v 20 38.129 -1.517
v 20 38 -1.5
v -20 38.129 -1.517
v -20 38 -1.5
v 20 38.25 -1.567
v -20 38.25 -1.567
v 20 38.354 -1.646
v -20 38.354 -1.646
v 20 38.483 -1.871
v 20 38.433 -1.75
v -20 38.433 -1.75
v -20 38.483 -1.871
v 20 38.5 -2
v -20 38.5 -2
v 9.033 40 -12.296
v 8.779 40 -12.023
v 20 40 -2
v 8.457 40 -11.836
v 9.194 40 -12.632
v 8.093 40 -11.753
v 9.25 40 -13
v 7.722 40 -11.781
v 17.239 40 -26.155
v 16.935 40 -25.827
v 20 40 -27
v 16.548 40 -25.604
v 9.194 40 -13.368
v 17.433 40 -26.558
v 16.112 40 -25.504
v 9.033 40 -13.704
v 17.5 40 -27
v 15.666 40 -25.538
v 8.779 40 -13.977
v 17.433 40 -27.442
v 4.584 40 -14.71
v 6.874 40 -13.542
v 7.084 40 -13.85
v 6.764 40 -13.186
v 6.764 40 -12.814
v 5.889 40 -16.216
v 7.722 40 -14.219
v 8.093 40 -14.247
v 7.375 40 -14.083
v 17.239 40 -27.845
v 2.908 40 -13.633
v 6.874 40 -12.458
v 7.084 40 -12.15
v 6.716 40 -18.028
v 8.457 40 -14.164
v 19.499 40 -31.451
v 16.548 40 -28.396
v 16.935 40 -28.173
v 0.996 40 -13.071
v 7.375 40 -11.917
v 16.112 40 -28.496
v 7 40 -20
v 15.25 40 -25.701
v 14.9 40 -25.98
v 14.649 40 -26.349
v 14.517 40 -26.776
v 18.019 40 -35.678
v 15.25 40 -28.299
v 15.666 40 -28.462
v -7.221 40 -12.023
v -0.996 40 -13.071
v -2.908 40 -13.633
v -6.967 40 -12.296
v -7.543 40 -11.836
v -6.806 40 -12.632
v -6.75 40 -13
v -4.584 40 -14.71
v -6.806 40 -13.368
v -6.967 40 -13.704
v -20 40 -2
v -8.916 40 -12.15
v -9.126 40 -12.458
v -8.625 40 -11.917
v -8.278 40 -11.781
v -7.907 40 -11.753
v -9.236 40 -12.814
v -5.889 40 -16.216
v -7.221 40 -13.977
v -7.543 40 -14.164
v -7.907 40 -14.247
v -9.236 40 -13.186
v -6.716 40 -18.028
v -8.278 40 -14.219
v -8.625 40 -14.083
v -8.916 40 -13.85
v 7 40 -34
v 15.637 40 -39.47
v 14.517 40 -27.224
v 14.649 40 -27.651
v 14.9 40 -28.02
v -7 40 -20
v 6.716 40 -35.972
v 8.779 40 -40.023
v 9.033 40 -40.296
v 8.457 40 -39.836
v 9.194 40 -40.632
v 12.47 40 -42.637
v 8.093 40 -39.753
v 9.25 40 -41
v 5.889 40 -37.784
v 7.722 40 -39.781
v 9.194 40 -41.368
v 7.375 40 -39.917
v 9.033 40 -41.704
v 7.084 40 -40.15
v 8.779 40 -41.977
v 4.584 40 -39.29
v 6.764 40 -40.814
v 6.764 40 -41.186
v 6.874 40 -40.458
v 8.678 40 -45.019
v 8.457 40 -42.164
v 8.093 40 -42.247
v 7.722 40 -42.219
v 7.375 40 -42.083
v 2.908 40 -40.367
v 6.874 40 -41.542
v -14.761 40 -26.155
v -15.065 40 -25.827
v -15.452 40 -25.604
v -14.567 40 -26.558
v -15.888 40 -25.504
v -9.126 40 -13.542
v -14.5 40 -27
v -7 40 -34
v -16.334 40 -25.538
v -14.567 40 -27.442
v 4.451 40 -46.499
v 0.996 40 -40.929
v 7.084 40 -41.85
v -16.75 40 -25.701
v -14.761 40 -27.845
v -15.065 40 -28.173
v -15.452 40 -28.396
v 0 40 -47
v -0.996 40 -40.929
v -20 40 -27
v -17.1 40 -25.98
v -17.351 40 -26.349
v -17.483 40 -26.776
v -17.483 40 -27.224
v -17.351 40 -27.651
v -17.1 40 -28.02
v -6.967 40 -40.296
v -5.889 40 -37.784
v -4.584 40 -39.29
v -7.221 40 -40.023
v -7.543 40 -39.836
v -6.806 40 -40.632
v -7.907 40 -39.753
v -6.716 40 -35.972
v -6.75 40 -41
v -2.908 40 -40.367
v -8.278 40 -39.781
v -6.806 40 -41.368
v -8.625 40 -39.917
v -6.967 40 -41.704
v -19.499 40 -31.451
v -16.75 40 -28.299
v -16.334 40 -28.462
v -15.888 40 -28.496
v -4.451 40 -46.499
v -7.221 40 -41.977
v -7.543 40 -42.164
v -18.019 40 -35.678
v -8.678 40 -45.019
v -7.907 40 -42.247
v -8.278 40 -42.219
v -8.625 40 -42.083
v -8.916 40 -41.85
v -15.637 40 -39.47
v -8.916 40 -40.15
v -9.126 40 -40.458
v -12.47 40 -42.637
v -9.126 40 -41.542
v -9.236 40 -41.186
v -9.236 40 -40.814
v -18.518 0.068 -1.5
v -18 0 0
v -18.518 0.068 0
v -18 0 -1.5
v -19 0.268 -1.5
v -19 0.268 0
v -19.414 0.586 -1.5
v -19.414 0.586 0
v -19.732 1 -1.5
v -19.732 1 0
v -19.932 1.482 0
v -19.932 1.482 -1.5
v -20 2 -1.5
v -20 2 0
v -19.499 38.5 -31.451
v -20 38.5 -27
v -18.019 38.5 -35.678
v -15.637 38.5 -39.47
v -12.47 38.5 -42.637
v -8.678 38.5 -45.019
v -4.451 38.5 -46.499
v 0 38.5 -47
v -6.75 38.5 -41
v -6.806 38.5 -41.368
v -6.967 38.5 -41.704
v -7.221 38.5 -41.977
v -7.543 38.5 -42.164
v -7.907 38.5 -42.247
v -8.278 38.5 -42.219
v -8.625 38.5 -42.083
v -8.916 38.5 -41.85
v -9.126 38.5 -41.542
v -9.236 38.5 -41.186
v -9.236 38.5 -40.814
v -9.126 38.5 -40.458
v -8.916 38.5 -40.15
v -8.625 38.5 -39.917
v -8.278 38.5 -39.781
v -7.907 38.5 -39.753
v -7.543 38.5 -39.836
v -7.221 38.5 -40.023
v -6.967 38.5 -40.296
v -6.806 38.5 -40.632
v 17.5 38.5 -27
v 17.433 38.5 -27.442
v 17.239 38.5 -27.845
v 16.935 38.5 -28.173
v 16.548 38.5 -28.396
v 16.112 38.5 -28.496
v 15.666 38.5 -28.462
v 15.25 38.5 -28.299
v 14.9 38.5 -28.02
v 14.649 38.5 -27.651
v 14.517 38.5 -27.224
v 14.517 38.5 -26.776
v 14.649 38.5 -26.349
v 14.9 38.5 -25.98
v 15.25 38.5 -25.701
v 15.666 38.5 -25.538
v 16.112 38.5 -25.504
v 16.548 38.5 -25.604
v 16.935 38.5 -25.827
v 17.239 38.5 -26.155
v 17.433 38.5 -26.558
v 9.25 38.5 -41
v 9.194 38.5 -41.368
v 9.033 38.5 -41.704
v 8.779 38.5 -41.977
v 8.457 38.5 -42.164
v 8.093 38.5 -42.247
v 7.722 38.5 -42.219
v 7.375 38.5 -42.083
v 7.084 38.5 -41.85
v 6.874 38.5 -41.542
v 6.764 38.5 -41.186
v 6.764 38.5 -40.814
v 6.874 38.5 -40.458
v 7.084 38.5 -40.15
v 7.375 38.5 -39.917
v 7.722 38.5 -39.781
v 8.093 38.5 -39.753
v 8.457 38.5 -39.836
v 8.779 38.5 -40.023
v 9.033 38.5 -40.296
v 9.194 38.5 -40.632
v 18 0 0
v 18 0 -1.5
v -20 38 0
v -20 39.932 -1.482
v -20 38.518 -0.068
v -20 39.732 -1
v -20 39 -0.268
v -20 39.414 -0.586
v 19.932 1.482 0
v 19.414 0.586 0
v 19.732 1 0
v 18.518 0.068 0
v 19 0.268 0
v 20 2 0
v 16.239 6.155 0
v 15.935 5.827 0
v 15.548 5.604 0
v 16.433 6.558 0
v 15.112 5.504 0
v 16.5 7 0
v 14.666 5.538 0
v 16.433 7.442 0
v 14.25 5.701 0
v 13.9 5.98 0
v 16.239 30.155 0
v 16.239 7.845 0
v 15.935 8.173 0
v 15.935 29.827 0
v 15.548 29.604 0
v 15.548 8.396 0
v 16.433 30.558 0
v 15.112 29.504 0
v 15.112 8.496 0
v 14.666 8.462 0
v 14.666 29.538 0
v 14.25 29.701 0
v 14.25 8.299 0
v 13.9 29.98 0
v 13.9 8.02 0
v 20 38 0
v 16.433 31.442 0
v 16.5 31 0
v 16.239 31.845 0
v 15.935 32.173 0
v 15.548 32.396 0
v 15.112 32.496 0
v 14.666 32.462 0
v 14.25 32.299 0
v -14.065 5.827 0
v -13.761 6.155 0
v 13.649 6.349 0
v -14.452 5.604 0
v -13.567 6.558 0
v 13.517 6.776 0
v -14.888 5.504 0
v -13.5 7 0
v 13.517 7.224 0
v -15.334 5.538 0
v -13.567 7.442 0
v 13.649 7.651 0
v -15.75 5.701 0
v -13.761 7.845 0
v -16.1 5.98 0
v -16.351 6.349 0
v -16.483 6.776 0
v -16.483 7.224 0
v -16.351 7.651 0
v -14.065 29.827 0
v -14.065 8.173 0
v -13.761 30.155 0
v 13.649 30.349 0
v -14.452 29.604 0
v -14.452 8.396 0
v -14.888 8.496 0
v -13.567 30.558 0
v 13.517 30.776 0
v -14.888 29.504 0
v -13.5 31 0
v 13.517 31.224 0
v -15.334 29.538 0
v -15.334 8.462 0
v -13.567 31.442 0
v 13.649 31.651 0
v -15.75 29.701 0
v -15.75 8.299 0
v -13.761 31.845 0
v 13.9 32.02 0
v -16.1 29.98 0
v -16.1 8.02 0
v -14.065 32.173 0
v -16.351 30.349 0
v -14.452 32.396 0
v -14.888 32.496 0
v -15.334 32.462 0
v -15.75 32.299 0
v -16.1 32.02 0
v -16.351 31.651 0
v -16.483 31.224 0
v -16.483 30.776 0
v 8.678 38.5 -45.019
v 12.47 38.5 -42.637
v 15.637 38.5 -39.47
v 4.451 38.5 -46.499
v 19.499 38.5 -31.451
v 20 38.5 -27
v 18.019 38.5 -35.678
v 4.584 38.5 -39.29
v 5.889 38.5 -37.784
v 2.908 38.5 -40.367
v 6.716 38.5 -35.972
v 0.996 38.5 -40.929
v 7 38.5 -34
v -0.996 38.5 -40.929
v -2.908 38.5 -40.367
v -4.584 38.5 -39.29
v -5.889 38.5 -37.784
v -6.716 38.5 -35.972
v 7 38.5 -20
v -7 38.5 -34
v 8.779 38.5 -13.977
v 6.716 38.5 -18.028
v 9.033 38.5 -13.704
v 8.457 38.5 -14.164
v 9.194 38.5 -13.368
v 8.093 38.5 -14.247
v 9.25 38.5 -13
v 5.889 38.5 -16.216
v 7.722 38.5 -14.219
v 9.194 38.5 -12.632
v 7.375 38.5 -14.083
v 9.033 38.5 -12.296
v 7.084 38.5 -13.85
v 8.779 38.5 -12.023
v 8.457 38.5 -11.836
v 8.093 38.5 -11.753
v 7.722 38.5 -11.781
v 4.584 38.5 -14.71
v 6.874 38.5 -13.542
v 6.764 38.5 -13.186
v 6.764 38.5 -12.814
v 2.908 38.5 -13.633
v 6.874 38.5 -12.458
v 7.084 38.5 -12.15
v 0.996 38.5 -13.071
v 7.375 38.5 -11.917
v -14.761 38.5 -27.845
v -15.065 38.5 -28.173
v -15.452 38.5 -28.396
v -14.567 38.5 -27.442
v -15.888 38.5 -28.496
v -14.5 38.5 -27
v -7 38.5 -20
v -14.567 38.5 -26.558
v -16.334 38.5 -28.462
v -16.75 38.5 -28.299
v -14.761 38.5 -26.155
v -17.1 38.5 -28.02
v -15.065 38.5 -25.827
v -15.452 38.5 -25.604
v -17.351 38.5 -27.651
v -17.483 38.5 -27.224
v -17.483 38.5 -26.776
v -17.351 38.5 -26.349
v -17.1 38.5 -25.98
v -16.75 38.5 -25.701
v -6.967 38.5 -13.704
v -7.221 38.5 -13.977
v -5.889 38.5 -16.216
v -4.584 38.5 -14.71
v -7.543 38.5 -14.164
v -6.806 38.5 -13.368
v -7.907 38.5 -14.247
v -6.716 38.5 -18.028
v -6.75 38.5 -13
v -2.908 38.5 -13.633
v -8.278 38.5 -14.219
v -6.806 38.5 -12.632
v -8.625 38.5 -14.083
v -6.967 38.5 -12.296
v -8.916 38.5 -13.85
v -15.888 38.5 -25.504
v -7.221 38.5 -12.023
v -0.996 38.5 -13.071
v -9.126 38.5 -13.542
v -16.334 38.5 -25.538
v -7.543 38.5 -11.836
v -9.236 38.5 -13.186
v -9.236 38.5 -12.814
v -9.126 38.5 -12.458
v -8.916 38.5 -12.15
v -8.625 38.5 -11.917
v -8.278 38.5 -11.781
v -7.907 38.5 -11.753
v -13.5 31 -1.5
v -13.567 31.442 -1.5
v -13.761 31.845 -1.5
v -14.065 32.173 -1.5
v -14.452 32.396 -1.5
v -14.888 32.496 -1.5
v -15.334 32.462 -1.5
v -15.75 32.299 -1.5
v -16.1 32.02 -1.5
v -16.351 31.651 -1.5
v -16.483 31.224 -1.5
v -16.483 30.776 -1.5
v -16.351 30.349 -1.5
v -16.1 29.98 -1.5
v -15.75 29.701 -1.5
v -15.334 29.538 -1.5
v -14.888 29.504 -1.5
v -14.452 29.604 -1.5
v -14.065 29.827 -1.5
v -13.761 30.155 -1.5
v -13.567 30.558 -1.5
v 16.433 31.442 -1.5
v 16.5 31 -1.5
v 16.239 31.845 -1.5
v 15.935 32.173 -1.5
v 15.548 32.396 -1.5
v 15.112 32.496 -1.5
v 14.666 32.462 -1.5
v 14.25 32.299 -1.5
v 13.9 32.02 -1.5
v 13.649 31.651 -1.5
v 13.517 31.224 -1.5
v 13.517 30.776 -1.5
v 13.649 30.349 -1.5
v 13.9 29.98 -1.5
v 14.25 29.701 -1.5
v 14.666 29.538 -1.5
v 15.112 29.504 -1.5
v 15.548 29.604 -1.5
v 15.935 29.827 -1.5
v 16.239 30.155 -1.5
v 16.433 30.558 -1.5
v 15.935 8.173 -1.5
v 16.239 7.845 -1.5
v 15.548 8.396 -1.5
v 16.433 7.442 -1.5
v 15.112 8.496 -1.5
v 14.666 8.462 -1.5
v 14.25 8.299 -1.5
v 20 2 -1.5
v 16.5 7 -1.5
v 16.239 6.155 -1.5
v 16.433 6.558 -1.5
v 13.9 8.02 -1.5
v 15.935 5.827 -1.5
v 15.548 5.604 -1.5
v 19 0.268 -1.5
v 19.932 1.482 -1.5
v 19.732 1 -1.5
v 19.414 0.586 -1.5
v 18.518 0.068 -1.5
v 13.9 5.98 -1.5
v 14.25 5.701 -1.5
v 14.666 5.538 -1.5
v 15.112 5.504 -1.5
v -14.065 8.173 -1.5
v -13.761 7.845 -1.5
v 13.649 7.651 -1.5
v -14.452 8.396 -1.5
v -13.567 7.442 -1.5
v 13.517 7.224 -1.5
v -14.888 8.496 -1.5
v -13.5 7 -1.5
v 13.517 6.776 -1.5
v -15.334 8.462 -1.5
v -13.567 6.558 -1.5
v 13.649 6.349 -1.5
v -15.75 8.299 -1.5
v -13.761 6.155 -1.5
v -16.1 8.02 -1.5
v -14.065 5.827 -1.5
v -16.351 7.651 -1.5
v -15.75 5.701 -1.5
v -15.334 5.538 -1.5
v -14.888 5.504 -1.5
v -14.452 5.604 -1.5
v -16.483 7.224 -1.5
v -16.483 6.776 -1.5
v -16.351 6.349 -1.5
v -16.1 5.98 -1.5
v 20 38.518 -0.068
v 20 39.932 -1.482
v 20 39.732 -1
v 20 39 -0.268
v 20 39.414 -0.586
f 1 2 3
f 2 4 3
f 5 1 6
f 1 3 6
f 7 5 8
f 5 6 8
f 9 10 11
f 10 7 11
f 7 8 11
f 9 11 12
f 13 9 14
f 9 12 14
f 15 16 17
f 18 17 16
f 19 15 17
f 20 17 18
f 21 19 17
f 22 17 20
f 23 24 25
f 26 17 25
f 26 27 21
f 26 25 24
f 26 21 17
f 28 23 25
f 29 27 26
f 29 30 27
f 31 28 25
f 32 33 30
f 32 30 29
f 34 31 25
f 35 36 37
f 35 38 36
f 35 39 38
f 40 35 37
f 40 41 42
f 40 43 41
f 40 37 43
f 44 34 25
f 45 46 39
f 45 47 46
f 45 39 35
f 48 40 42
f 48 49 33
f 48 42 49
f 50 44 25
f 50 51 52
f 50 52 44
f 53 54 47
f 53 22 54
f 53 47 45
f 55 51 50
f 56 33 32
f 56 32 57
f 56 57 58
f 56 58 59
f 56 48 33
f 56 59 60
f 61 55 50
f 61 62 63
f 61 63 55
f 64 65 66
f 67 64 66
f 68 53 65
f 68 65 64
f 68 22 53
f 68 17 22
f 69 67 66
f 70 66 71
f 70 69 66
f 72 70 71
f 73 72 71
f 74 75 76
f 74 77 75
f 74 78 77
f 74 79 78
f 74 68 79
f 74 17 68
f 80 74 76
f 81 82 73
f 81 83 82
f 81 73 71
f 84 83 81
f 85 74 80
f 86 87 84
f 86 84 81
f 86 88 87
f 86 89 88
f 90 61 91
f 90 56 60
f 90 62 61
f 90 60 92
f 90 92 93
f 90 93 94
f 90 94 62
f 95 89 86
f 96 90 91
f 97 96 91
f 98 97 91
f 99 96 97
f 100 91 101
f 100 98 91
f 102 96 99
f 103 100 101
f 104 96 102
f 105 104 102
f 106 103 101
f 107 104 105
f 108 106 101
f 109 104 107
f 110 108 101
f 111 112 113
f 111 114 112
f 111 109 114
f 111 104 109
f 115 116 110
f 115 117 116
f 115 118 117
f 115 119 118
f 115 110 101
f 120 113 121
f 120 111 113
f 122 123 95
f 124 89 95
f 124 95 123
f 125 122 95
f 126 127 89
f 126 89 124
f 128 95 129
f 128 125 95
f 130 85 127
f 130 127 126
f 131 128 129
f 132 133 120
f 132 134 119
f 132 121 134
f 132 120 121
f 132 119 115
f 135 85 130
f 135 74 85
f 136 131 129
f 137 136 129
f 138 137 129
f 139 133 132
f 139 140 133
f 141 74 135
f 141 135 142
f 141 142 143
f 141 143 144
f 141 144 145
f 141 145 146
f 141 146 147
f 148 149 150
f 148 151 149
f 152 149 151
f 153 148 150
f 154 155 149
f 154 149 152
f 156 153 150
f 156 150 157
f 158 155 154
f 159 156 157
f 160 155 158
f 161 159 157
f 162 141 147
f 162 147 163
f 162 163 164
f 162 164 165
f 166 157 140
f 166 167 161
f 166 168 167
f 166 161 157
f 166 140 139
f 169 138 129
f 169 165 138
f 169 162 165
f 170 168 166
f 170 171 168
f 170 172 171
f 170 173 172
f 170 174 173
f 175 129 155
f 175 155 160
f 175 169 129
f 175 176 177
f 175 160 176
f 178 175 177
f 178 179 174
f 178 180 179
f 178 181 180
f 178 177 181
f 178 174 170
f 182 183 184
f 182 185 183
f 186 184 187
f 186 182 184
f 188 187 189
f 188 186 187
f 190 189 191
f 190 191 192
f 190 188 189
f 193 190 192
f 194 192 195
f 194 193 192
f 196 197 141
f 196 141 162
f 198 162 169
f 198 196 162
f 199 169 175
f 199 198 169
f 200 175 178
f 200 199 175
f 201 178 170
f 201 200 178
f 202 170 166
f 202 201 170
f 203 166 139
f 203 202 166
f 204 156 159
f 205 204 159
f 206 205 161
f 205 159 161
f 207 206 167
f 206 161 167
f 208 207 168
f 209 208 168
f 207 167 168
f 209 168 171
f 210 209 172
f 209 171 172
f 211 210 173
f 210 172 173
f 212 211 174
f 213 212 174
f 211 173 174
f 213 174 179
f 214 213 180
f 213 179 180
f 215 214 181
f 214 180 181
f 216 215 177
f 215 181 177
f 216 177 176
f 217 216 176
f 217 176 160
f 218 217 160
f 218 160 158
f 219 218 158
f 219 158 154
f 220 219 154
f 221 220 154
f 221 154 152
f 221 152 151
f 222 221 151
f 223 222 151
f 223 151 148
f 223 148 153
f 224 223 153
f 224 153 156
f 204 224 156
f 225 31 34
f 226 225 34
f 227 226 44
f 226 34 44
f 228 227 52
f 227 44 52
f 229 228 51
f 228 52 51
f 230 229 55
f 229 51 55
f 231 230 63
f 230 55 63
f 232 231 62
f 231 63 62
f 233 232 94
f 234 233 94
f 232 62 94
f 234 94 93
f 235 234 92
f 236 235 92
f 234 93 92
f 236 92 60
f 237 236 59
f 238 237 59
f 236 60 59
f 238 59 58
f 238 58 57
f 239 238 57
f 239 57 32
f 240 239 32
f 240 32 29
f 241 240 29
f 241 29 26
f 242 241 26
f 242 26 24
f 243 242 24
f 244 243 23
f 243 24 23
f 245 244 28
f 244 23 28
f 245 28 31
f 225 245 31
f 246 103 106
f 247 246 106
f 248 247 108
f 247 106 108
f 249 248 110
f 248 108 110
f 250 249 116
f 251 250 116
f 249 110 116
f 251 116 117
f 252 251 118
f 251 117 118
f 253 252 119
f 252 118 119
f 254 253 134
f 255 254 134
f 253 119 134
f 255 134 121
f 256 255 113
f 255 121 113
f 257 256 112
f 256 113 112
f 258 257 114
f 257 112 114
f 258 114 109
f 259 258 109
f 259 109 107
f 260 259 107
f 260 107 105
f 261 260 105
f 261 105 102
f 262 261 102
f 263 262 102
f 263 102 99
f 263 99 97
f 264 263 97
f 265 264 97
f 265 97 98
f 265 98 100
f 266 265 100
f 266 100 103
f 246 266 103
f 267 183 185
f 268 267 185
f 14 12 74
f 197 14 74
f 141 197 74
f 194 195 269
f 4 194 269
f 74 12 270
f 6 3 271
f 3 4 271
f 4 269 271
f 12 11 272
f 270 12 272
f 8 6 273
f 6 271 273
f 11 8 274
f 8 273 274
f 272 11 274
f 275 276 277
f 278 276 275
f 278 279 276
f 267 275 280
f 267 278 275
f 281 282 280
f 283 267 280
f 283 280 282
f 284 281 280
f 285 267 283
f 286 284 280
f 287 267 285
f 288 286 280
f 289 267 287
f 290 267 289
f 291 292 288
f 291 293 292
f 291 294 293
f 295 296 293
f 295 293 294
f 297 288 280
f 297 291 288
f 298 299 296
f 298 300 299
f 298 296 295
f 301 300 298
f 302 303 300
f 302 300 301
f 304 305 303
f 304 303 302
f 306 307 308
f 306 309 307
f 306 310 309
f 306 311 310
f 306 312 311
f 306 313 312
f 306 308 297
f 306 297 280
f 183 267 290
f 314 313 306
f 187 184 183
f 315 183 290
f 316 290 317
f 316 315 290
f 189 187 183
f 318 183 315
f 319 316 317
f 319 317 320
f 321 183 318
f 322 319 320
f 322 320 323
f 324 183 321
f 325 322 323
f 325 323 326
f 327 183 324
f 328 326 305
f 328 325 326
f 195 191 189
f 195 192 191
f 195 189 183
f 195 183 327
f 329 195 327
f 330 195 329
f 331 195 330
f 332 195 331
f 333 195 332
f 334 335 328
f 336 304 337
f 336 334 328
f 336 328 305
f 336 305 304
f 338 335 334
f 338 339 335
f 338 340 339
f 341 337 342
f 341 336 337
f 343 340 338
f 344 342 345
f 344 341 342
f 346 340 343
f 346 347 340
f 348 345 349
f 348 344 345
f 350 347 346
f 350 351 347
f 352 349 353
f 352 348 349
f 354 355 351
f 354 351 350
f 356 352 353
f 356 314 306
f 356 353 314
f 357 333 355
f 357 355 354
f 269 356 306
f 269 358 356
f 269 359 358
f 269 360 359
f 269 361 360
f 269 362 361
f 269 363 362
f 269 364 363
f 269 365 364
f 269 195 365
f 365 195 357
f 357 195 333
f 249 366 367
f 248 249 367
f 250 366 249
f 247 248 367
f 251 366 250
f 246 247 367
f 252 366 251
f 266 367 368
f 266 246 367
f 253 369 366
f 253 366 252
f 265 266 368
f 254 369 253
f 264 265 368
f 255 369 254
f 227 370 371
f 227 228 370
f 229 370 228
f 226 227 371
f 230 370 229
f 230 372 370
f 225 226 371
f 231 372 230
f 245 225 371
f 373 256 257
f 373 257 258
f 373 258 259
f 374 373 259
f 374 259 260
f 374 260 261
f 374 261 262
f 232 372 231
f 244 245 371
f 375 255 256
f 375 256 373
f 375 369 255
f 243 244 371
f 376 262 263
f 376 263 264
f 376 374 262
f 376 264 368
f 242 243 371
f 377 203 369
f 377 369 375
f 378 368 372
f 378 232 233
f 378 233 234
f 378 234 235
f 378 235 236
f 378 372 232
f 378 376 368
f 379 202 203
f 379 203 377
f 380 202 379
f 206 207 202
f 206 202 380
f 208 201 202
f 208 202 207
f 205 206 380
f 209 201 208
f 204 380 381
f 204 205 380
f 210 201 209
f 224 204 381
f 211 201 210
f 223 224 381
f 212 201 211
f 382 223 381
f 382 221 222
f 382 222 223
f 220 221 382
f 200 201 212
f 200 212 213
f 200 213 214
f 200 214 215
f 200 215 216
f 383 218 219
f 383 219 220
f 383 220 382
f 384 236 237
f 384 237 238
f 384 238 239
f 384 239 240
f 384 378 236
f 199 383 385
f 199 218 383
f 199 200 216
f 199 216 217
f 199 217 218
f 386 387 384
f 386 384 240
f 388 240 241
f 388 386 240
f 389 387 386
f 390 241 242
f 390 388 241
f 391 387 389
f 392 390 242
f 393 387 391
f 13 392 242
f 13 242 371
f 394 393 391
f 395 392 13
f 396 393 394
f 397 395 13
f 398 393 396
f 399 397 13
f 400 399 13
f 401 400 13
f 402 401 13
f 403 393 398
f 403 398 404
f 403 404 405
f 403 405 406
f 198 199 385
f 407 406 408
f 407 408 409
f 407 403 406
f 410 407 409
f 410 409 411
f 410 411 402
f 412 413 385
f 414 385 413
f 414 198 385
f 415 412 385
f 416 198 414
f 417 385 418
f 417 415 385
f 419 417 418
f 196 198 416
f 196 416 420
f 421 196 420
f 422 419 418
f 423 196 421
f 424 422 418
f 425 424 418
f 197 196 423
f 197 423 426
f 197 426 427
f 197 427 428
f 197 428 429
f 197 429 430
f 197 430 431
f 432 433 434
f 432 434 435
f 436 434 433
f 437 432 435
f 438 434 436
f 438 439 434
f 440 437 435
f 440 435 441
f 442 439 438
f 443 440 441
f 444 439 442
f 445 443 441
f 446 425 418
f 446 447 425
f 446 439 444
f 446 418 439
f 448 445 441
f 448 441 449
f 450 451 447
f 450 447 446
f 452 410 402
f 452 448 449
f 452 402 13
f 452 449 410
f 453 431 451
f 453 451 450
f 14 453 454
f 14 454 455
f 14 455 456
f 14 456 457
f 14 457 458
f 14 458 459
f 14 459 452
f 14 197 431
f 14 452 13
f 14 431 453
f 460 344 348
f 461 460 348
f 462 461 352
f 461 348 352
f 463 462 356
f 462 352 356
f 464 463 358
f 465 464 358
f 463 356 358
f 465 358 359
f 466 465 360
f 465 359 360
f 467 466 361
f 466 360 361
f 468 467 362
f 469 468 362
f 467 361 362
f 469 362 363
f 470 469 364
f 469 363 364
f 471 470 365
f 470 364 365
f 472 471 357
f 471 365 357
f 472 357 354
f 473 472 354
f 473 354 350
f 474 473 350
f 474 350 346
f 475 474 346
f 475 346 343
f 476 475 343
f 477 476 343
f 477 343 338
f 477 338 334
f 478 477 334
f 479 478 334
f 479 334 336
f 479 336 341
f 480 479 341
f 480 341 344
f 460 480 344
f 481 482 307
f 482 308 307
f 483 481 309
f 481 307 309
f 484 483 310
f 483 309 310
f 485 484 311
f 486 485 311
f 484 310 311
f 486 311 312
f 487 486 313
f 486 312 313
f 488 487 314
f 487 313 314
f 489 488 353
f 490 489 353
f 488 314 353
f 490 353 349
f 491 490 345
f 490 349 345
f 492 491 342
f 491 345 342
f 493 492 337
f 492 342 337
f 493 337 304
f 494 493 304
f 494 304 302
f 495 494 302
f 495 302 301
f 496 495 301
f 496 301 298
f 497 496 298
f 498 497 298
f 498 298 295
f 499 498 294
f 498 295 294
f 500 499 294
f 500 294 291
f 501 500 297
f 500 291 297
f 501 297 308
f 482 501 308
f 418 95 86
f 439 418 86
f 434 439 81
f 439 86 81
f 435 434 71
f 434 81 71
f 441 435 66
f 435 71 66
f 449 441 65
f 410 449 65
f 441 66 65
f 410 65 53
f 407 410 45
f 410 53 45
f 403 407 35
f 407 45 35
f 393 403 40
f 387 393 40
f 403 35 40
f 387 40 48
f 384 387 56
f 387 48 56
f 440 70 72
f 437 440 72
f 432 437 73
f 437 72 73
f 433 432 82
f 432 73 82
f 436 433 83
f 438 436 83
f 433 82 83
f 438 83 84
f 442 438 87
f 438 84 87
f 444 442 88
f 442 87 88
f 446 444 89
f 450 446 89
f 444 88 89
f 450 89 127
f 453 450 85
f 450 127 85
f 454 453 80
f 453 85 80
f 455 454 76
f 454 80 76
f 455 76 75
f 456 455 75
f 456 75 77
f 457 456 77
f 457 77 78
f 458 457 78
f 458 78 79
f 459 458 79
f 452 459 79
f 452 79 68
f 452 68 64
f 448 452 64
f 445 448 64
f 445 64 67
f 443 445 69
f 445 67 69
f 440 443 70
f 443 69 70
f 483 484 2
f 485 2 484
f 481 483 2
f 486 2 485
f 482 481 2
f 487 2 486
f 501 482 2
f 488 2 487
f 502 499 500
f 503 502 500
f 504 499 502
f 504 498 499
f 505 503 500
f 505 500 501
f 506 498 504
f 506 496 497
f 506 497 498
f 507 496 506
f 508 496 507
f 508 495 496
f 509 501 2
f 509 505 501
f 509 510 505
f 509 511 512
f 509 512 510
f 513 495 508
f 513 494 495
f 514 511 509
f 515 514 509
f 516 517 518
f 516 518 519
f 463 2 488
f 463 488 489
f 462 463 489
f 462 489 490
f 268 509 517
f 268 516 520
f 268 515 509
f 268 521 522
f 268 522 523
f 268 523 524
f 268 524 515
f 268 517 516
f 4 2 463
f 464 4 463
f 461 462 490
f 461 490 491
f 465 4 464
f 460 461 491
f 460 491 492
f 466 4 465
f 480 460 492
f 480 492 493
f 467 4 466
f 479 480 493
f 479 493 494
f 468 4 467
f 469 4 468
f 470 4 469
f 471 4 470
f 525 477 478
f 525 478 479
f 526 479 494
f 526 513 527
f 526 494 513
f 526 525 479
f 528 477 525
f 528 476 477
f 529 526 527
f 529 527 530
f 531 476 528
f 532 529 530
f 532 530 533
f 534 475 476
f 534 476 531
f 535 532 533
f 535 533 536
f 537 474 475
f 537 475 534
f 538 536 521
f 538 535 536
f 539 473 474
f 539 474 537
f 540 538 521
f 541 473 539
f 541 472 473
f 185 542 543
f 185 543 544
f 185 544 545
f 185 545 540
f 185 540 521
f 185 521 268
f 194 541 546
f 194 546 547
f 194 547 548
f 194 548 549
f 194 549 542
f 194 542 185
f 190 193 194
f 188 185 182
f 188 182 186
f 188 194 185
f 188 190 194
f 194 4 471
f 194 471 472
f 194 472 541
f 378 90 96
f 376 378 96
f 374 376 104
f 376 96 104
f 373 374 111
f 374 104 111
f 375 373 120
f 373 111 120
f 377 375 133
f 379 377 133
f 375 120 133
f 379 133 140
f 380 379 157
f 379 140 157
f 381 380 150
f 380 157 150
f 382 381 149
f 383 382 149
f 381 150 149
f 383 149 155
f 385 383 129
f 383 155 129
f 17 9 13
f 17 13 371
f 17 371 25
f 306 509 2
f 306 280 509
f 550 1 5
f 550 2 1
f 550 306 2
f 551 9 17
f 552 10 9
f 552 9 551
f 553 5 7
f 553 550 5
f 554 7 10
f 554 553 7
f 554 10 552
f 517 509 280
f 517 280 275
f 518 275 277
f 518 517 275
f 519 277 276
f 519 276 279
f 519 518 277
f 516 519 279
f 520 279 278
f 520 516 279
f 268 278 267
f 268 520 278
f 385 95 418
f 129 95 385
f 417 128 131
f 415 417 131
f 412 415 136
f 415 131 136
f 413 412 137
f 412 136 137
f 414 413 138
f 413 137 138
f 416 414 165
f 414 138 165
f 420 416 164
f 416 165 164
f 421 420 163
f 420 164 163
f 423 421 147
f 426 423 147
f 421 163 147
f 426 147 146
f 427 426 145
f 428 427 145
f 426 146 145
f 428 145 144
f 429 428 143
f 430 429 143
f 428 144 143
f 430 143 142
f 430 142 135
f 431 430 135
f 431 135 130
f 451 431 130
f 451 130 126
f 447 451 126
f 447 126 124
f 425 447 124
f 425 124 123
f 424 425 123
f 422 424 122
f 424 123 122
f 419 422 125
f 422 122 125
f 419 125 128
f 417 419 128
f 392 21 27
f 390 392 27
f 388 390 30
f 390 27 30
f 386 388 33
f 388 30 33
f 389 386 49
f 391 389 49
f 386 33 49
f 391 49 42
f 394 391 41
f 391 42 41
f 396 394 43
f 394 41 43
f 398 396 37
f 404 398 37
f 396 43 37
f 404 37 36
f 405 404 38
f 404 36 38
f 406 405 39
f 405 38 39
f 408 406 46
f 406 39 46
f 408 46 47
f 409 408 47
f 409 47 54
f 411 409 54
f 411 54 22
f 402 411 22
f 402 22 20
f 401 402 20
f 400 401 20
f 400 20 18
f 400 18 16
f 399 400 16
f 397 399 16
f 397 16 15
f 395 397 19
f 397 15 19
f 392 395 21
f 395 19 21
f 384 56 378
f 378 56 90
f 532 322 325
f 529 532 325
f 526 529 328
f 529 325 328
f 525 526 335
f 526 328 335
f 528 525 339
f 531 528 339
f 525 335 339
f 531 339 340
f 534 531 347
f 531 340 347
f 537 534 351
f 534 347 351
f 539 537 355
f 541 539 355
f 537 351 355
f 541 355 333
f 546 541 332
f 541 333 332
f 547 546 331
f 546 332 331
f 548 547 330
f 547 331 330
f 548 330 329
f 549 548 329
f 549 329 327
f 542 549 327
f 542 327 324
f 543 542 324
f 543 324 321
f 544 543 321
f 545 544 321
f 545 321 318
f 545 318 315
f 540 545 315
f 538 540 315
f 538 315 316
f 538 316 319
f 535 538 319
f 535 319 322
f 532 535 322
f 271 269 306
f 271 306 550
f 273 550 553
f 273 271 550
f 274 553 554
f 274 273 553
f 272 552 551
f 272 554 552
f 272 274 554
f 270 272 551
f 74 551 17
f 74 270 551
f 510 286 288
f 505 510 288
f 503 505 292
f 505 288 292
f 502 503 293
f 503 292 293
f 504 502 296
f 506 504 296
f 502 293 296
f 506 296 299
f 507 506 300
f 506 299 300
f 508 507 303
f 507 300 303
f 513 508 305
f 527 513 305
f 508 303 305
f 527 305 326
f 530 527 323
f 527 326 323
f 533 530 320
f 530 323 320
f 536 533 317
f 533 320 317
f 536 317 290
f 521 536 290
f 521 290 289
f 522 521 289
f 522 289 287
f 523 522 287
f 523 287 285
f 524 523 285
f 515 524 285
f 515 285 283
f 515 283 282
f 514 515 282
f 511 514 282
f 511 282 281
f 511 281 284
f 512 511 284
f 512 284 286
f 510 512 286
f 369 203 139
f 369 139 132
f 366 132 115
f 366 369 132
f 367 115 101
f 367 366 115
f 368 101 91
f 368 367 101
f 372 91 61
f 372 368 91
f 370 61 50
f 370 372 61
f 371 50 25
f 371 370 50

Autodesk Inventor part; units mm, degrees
ref_plane "YZ Plane" through (0, 0, 0) normal (1, 0, 0) x (0, 1, 0)
ref_plane "XZ Plane" through (0, 0, 0) normal (0, 1, 0) x (-1, 0, 0)
ref_plane "XY Plane" through (0, 0, 0) normal (0, 0, 1) x (1, 0, 0)
sketch "Sketch1" plane through (0, 0, 0) normal (1, 0, 0) x (0, 1, 0)
  line L0 (0, 0) -> (38, 0)
  line L1 (40, -2) -> (40, -47)
  arc A0 (40, -2) -> (38, 0) centre (38, -2) ccw
  line L2 (38.5, -47) -> (38.5, -2)
  arc A1 (38.5, -2) -> (38, -1.5) centre (38, -2) ccw
  line L3 (38, -1.5) -> (0, -1.5)
  line L4 (40, -47) -> (38.5, -47)
  line L5 (0, 0) -> (0, -1.5)
  point P0 (40, 0)
  dimension "d0" = 47
  dimension "d1" = 40
  dimension "d2" = 2
  dimension "d3" = 1.5
extrude "Extrusion1" add sketch "Sketch1" along normal mid plane 40
fillet "Fillet1" radius 20 2 edges at (20, 39.25, -47) (-20, 39.25, -47)
fillet "Fillet2" radius 2 2 edges at (-20, 0, -0.75) (20, 0, -0.75)
sketch "Sketch2" plane through (-20, 38, 0) normal (0, 0, 1) x (1, 0, 0)
  circle A0 centre (5, -7) radius 1.5 projected
  circle A1 centre (5, -31) radius 1.5 projected
  circle A2 centre (35, -31) radius 1.5 projected
  circle A3 centre (35, -7) radius 1.5 projected
  point P0 (20, -38)
extrude "Extrusion2" cut sketch "Sketch2" against normal through all
sketch "Sketch3" plane through (-20, 40, -2) normal (0, 1, 0) x (1, 0, 0)
  arc A0 (13, 18) -> (27, 18) centre (20, 18) ccw
  arc A1 (27, 32) -> (13, 32) centre (20, 32) ccw
  line L0 (13, 18) -> (13, 32)
  line L1 (27, 18) -> (27, 32)
  arc A2 (40, 25) -> (0, 25) centre (20, 25) ccw projected
  circle A3 centre (36, 25) radius 1.5
  circle A4 centre (4, 25) radius 1.5
  circle A5 centre (28, 11) radius 1.25
  circle A6 centre (12, 11) radius 1.25
  line L2 (40, 0) -> (40, 25) projected
  line L3 (40, 25) -> (0, 25)
  circle A7 centre (28, 39) radius 1.25
  circle A8 centre (12, 39) radius 1.25
  point P0 (20, -2)
  dimension "d10" = 14
  dimension "d11" = 14
  dimension "d12" = 28
  dimension "d13" = 7
  dimension "d14" = 3
  dimension "d15" = 3
  dimension "d16" = 32
  dimension "d17" = 16
  dimension "d18" = 2.5
  dimension "d19" = 2.5
  dimension "d20" = 16
  dimension "d21" = 8
extrude "Extrusion3" cut sketch "Sketch3" against normal through all contours L0 L3 L1 A0 | L0 A1 L1 L3 | L3 A4 | A4 L3 | L3 A3 | A3 L3 | A5 | A6 | A7 | A8
equation "\"d17\" = 0.5 * d16"
equation "\"d21\" = 0.5 * d20"
properties part number "MotorMount"
